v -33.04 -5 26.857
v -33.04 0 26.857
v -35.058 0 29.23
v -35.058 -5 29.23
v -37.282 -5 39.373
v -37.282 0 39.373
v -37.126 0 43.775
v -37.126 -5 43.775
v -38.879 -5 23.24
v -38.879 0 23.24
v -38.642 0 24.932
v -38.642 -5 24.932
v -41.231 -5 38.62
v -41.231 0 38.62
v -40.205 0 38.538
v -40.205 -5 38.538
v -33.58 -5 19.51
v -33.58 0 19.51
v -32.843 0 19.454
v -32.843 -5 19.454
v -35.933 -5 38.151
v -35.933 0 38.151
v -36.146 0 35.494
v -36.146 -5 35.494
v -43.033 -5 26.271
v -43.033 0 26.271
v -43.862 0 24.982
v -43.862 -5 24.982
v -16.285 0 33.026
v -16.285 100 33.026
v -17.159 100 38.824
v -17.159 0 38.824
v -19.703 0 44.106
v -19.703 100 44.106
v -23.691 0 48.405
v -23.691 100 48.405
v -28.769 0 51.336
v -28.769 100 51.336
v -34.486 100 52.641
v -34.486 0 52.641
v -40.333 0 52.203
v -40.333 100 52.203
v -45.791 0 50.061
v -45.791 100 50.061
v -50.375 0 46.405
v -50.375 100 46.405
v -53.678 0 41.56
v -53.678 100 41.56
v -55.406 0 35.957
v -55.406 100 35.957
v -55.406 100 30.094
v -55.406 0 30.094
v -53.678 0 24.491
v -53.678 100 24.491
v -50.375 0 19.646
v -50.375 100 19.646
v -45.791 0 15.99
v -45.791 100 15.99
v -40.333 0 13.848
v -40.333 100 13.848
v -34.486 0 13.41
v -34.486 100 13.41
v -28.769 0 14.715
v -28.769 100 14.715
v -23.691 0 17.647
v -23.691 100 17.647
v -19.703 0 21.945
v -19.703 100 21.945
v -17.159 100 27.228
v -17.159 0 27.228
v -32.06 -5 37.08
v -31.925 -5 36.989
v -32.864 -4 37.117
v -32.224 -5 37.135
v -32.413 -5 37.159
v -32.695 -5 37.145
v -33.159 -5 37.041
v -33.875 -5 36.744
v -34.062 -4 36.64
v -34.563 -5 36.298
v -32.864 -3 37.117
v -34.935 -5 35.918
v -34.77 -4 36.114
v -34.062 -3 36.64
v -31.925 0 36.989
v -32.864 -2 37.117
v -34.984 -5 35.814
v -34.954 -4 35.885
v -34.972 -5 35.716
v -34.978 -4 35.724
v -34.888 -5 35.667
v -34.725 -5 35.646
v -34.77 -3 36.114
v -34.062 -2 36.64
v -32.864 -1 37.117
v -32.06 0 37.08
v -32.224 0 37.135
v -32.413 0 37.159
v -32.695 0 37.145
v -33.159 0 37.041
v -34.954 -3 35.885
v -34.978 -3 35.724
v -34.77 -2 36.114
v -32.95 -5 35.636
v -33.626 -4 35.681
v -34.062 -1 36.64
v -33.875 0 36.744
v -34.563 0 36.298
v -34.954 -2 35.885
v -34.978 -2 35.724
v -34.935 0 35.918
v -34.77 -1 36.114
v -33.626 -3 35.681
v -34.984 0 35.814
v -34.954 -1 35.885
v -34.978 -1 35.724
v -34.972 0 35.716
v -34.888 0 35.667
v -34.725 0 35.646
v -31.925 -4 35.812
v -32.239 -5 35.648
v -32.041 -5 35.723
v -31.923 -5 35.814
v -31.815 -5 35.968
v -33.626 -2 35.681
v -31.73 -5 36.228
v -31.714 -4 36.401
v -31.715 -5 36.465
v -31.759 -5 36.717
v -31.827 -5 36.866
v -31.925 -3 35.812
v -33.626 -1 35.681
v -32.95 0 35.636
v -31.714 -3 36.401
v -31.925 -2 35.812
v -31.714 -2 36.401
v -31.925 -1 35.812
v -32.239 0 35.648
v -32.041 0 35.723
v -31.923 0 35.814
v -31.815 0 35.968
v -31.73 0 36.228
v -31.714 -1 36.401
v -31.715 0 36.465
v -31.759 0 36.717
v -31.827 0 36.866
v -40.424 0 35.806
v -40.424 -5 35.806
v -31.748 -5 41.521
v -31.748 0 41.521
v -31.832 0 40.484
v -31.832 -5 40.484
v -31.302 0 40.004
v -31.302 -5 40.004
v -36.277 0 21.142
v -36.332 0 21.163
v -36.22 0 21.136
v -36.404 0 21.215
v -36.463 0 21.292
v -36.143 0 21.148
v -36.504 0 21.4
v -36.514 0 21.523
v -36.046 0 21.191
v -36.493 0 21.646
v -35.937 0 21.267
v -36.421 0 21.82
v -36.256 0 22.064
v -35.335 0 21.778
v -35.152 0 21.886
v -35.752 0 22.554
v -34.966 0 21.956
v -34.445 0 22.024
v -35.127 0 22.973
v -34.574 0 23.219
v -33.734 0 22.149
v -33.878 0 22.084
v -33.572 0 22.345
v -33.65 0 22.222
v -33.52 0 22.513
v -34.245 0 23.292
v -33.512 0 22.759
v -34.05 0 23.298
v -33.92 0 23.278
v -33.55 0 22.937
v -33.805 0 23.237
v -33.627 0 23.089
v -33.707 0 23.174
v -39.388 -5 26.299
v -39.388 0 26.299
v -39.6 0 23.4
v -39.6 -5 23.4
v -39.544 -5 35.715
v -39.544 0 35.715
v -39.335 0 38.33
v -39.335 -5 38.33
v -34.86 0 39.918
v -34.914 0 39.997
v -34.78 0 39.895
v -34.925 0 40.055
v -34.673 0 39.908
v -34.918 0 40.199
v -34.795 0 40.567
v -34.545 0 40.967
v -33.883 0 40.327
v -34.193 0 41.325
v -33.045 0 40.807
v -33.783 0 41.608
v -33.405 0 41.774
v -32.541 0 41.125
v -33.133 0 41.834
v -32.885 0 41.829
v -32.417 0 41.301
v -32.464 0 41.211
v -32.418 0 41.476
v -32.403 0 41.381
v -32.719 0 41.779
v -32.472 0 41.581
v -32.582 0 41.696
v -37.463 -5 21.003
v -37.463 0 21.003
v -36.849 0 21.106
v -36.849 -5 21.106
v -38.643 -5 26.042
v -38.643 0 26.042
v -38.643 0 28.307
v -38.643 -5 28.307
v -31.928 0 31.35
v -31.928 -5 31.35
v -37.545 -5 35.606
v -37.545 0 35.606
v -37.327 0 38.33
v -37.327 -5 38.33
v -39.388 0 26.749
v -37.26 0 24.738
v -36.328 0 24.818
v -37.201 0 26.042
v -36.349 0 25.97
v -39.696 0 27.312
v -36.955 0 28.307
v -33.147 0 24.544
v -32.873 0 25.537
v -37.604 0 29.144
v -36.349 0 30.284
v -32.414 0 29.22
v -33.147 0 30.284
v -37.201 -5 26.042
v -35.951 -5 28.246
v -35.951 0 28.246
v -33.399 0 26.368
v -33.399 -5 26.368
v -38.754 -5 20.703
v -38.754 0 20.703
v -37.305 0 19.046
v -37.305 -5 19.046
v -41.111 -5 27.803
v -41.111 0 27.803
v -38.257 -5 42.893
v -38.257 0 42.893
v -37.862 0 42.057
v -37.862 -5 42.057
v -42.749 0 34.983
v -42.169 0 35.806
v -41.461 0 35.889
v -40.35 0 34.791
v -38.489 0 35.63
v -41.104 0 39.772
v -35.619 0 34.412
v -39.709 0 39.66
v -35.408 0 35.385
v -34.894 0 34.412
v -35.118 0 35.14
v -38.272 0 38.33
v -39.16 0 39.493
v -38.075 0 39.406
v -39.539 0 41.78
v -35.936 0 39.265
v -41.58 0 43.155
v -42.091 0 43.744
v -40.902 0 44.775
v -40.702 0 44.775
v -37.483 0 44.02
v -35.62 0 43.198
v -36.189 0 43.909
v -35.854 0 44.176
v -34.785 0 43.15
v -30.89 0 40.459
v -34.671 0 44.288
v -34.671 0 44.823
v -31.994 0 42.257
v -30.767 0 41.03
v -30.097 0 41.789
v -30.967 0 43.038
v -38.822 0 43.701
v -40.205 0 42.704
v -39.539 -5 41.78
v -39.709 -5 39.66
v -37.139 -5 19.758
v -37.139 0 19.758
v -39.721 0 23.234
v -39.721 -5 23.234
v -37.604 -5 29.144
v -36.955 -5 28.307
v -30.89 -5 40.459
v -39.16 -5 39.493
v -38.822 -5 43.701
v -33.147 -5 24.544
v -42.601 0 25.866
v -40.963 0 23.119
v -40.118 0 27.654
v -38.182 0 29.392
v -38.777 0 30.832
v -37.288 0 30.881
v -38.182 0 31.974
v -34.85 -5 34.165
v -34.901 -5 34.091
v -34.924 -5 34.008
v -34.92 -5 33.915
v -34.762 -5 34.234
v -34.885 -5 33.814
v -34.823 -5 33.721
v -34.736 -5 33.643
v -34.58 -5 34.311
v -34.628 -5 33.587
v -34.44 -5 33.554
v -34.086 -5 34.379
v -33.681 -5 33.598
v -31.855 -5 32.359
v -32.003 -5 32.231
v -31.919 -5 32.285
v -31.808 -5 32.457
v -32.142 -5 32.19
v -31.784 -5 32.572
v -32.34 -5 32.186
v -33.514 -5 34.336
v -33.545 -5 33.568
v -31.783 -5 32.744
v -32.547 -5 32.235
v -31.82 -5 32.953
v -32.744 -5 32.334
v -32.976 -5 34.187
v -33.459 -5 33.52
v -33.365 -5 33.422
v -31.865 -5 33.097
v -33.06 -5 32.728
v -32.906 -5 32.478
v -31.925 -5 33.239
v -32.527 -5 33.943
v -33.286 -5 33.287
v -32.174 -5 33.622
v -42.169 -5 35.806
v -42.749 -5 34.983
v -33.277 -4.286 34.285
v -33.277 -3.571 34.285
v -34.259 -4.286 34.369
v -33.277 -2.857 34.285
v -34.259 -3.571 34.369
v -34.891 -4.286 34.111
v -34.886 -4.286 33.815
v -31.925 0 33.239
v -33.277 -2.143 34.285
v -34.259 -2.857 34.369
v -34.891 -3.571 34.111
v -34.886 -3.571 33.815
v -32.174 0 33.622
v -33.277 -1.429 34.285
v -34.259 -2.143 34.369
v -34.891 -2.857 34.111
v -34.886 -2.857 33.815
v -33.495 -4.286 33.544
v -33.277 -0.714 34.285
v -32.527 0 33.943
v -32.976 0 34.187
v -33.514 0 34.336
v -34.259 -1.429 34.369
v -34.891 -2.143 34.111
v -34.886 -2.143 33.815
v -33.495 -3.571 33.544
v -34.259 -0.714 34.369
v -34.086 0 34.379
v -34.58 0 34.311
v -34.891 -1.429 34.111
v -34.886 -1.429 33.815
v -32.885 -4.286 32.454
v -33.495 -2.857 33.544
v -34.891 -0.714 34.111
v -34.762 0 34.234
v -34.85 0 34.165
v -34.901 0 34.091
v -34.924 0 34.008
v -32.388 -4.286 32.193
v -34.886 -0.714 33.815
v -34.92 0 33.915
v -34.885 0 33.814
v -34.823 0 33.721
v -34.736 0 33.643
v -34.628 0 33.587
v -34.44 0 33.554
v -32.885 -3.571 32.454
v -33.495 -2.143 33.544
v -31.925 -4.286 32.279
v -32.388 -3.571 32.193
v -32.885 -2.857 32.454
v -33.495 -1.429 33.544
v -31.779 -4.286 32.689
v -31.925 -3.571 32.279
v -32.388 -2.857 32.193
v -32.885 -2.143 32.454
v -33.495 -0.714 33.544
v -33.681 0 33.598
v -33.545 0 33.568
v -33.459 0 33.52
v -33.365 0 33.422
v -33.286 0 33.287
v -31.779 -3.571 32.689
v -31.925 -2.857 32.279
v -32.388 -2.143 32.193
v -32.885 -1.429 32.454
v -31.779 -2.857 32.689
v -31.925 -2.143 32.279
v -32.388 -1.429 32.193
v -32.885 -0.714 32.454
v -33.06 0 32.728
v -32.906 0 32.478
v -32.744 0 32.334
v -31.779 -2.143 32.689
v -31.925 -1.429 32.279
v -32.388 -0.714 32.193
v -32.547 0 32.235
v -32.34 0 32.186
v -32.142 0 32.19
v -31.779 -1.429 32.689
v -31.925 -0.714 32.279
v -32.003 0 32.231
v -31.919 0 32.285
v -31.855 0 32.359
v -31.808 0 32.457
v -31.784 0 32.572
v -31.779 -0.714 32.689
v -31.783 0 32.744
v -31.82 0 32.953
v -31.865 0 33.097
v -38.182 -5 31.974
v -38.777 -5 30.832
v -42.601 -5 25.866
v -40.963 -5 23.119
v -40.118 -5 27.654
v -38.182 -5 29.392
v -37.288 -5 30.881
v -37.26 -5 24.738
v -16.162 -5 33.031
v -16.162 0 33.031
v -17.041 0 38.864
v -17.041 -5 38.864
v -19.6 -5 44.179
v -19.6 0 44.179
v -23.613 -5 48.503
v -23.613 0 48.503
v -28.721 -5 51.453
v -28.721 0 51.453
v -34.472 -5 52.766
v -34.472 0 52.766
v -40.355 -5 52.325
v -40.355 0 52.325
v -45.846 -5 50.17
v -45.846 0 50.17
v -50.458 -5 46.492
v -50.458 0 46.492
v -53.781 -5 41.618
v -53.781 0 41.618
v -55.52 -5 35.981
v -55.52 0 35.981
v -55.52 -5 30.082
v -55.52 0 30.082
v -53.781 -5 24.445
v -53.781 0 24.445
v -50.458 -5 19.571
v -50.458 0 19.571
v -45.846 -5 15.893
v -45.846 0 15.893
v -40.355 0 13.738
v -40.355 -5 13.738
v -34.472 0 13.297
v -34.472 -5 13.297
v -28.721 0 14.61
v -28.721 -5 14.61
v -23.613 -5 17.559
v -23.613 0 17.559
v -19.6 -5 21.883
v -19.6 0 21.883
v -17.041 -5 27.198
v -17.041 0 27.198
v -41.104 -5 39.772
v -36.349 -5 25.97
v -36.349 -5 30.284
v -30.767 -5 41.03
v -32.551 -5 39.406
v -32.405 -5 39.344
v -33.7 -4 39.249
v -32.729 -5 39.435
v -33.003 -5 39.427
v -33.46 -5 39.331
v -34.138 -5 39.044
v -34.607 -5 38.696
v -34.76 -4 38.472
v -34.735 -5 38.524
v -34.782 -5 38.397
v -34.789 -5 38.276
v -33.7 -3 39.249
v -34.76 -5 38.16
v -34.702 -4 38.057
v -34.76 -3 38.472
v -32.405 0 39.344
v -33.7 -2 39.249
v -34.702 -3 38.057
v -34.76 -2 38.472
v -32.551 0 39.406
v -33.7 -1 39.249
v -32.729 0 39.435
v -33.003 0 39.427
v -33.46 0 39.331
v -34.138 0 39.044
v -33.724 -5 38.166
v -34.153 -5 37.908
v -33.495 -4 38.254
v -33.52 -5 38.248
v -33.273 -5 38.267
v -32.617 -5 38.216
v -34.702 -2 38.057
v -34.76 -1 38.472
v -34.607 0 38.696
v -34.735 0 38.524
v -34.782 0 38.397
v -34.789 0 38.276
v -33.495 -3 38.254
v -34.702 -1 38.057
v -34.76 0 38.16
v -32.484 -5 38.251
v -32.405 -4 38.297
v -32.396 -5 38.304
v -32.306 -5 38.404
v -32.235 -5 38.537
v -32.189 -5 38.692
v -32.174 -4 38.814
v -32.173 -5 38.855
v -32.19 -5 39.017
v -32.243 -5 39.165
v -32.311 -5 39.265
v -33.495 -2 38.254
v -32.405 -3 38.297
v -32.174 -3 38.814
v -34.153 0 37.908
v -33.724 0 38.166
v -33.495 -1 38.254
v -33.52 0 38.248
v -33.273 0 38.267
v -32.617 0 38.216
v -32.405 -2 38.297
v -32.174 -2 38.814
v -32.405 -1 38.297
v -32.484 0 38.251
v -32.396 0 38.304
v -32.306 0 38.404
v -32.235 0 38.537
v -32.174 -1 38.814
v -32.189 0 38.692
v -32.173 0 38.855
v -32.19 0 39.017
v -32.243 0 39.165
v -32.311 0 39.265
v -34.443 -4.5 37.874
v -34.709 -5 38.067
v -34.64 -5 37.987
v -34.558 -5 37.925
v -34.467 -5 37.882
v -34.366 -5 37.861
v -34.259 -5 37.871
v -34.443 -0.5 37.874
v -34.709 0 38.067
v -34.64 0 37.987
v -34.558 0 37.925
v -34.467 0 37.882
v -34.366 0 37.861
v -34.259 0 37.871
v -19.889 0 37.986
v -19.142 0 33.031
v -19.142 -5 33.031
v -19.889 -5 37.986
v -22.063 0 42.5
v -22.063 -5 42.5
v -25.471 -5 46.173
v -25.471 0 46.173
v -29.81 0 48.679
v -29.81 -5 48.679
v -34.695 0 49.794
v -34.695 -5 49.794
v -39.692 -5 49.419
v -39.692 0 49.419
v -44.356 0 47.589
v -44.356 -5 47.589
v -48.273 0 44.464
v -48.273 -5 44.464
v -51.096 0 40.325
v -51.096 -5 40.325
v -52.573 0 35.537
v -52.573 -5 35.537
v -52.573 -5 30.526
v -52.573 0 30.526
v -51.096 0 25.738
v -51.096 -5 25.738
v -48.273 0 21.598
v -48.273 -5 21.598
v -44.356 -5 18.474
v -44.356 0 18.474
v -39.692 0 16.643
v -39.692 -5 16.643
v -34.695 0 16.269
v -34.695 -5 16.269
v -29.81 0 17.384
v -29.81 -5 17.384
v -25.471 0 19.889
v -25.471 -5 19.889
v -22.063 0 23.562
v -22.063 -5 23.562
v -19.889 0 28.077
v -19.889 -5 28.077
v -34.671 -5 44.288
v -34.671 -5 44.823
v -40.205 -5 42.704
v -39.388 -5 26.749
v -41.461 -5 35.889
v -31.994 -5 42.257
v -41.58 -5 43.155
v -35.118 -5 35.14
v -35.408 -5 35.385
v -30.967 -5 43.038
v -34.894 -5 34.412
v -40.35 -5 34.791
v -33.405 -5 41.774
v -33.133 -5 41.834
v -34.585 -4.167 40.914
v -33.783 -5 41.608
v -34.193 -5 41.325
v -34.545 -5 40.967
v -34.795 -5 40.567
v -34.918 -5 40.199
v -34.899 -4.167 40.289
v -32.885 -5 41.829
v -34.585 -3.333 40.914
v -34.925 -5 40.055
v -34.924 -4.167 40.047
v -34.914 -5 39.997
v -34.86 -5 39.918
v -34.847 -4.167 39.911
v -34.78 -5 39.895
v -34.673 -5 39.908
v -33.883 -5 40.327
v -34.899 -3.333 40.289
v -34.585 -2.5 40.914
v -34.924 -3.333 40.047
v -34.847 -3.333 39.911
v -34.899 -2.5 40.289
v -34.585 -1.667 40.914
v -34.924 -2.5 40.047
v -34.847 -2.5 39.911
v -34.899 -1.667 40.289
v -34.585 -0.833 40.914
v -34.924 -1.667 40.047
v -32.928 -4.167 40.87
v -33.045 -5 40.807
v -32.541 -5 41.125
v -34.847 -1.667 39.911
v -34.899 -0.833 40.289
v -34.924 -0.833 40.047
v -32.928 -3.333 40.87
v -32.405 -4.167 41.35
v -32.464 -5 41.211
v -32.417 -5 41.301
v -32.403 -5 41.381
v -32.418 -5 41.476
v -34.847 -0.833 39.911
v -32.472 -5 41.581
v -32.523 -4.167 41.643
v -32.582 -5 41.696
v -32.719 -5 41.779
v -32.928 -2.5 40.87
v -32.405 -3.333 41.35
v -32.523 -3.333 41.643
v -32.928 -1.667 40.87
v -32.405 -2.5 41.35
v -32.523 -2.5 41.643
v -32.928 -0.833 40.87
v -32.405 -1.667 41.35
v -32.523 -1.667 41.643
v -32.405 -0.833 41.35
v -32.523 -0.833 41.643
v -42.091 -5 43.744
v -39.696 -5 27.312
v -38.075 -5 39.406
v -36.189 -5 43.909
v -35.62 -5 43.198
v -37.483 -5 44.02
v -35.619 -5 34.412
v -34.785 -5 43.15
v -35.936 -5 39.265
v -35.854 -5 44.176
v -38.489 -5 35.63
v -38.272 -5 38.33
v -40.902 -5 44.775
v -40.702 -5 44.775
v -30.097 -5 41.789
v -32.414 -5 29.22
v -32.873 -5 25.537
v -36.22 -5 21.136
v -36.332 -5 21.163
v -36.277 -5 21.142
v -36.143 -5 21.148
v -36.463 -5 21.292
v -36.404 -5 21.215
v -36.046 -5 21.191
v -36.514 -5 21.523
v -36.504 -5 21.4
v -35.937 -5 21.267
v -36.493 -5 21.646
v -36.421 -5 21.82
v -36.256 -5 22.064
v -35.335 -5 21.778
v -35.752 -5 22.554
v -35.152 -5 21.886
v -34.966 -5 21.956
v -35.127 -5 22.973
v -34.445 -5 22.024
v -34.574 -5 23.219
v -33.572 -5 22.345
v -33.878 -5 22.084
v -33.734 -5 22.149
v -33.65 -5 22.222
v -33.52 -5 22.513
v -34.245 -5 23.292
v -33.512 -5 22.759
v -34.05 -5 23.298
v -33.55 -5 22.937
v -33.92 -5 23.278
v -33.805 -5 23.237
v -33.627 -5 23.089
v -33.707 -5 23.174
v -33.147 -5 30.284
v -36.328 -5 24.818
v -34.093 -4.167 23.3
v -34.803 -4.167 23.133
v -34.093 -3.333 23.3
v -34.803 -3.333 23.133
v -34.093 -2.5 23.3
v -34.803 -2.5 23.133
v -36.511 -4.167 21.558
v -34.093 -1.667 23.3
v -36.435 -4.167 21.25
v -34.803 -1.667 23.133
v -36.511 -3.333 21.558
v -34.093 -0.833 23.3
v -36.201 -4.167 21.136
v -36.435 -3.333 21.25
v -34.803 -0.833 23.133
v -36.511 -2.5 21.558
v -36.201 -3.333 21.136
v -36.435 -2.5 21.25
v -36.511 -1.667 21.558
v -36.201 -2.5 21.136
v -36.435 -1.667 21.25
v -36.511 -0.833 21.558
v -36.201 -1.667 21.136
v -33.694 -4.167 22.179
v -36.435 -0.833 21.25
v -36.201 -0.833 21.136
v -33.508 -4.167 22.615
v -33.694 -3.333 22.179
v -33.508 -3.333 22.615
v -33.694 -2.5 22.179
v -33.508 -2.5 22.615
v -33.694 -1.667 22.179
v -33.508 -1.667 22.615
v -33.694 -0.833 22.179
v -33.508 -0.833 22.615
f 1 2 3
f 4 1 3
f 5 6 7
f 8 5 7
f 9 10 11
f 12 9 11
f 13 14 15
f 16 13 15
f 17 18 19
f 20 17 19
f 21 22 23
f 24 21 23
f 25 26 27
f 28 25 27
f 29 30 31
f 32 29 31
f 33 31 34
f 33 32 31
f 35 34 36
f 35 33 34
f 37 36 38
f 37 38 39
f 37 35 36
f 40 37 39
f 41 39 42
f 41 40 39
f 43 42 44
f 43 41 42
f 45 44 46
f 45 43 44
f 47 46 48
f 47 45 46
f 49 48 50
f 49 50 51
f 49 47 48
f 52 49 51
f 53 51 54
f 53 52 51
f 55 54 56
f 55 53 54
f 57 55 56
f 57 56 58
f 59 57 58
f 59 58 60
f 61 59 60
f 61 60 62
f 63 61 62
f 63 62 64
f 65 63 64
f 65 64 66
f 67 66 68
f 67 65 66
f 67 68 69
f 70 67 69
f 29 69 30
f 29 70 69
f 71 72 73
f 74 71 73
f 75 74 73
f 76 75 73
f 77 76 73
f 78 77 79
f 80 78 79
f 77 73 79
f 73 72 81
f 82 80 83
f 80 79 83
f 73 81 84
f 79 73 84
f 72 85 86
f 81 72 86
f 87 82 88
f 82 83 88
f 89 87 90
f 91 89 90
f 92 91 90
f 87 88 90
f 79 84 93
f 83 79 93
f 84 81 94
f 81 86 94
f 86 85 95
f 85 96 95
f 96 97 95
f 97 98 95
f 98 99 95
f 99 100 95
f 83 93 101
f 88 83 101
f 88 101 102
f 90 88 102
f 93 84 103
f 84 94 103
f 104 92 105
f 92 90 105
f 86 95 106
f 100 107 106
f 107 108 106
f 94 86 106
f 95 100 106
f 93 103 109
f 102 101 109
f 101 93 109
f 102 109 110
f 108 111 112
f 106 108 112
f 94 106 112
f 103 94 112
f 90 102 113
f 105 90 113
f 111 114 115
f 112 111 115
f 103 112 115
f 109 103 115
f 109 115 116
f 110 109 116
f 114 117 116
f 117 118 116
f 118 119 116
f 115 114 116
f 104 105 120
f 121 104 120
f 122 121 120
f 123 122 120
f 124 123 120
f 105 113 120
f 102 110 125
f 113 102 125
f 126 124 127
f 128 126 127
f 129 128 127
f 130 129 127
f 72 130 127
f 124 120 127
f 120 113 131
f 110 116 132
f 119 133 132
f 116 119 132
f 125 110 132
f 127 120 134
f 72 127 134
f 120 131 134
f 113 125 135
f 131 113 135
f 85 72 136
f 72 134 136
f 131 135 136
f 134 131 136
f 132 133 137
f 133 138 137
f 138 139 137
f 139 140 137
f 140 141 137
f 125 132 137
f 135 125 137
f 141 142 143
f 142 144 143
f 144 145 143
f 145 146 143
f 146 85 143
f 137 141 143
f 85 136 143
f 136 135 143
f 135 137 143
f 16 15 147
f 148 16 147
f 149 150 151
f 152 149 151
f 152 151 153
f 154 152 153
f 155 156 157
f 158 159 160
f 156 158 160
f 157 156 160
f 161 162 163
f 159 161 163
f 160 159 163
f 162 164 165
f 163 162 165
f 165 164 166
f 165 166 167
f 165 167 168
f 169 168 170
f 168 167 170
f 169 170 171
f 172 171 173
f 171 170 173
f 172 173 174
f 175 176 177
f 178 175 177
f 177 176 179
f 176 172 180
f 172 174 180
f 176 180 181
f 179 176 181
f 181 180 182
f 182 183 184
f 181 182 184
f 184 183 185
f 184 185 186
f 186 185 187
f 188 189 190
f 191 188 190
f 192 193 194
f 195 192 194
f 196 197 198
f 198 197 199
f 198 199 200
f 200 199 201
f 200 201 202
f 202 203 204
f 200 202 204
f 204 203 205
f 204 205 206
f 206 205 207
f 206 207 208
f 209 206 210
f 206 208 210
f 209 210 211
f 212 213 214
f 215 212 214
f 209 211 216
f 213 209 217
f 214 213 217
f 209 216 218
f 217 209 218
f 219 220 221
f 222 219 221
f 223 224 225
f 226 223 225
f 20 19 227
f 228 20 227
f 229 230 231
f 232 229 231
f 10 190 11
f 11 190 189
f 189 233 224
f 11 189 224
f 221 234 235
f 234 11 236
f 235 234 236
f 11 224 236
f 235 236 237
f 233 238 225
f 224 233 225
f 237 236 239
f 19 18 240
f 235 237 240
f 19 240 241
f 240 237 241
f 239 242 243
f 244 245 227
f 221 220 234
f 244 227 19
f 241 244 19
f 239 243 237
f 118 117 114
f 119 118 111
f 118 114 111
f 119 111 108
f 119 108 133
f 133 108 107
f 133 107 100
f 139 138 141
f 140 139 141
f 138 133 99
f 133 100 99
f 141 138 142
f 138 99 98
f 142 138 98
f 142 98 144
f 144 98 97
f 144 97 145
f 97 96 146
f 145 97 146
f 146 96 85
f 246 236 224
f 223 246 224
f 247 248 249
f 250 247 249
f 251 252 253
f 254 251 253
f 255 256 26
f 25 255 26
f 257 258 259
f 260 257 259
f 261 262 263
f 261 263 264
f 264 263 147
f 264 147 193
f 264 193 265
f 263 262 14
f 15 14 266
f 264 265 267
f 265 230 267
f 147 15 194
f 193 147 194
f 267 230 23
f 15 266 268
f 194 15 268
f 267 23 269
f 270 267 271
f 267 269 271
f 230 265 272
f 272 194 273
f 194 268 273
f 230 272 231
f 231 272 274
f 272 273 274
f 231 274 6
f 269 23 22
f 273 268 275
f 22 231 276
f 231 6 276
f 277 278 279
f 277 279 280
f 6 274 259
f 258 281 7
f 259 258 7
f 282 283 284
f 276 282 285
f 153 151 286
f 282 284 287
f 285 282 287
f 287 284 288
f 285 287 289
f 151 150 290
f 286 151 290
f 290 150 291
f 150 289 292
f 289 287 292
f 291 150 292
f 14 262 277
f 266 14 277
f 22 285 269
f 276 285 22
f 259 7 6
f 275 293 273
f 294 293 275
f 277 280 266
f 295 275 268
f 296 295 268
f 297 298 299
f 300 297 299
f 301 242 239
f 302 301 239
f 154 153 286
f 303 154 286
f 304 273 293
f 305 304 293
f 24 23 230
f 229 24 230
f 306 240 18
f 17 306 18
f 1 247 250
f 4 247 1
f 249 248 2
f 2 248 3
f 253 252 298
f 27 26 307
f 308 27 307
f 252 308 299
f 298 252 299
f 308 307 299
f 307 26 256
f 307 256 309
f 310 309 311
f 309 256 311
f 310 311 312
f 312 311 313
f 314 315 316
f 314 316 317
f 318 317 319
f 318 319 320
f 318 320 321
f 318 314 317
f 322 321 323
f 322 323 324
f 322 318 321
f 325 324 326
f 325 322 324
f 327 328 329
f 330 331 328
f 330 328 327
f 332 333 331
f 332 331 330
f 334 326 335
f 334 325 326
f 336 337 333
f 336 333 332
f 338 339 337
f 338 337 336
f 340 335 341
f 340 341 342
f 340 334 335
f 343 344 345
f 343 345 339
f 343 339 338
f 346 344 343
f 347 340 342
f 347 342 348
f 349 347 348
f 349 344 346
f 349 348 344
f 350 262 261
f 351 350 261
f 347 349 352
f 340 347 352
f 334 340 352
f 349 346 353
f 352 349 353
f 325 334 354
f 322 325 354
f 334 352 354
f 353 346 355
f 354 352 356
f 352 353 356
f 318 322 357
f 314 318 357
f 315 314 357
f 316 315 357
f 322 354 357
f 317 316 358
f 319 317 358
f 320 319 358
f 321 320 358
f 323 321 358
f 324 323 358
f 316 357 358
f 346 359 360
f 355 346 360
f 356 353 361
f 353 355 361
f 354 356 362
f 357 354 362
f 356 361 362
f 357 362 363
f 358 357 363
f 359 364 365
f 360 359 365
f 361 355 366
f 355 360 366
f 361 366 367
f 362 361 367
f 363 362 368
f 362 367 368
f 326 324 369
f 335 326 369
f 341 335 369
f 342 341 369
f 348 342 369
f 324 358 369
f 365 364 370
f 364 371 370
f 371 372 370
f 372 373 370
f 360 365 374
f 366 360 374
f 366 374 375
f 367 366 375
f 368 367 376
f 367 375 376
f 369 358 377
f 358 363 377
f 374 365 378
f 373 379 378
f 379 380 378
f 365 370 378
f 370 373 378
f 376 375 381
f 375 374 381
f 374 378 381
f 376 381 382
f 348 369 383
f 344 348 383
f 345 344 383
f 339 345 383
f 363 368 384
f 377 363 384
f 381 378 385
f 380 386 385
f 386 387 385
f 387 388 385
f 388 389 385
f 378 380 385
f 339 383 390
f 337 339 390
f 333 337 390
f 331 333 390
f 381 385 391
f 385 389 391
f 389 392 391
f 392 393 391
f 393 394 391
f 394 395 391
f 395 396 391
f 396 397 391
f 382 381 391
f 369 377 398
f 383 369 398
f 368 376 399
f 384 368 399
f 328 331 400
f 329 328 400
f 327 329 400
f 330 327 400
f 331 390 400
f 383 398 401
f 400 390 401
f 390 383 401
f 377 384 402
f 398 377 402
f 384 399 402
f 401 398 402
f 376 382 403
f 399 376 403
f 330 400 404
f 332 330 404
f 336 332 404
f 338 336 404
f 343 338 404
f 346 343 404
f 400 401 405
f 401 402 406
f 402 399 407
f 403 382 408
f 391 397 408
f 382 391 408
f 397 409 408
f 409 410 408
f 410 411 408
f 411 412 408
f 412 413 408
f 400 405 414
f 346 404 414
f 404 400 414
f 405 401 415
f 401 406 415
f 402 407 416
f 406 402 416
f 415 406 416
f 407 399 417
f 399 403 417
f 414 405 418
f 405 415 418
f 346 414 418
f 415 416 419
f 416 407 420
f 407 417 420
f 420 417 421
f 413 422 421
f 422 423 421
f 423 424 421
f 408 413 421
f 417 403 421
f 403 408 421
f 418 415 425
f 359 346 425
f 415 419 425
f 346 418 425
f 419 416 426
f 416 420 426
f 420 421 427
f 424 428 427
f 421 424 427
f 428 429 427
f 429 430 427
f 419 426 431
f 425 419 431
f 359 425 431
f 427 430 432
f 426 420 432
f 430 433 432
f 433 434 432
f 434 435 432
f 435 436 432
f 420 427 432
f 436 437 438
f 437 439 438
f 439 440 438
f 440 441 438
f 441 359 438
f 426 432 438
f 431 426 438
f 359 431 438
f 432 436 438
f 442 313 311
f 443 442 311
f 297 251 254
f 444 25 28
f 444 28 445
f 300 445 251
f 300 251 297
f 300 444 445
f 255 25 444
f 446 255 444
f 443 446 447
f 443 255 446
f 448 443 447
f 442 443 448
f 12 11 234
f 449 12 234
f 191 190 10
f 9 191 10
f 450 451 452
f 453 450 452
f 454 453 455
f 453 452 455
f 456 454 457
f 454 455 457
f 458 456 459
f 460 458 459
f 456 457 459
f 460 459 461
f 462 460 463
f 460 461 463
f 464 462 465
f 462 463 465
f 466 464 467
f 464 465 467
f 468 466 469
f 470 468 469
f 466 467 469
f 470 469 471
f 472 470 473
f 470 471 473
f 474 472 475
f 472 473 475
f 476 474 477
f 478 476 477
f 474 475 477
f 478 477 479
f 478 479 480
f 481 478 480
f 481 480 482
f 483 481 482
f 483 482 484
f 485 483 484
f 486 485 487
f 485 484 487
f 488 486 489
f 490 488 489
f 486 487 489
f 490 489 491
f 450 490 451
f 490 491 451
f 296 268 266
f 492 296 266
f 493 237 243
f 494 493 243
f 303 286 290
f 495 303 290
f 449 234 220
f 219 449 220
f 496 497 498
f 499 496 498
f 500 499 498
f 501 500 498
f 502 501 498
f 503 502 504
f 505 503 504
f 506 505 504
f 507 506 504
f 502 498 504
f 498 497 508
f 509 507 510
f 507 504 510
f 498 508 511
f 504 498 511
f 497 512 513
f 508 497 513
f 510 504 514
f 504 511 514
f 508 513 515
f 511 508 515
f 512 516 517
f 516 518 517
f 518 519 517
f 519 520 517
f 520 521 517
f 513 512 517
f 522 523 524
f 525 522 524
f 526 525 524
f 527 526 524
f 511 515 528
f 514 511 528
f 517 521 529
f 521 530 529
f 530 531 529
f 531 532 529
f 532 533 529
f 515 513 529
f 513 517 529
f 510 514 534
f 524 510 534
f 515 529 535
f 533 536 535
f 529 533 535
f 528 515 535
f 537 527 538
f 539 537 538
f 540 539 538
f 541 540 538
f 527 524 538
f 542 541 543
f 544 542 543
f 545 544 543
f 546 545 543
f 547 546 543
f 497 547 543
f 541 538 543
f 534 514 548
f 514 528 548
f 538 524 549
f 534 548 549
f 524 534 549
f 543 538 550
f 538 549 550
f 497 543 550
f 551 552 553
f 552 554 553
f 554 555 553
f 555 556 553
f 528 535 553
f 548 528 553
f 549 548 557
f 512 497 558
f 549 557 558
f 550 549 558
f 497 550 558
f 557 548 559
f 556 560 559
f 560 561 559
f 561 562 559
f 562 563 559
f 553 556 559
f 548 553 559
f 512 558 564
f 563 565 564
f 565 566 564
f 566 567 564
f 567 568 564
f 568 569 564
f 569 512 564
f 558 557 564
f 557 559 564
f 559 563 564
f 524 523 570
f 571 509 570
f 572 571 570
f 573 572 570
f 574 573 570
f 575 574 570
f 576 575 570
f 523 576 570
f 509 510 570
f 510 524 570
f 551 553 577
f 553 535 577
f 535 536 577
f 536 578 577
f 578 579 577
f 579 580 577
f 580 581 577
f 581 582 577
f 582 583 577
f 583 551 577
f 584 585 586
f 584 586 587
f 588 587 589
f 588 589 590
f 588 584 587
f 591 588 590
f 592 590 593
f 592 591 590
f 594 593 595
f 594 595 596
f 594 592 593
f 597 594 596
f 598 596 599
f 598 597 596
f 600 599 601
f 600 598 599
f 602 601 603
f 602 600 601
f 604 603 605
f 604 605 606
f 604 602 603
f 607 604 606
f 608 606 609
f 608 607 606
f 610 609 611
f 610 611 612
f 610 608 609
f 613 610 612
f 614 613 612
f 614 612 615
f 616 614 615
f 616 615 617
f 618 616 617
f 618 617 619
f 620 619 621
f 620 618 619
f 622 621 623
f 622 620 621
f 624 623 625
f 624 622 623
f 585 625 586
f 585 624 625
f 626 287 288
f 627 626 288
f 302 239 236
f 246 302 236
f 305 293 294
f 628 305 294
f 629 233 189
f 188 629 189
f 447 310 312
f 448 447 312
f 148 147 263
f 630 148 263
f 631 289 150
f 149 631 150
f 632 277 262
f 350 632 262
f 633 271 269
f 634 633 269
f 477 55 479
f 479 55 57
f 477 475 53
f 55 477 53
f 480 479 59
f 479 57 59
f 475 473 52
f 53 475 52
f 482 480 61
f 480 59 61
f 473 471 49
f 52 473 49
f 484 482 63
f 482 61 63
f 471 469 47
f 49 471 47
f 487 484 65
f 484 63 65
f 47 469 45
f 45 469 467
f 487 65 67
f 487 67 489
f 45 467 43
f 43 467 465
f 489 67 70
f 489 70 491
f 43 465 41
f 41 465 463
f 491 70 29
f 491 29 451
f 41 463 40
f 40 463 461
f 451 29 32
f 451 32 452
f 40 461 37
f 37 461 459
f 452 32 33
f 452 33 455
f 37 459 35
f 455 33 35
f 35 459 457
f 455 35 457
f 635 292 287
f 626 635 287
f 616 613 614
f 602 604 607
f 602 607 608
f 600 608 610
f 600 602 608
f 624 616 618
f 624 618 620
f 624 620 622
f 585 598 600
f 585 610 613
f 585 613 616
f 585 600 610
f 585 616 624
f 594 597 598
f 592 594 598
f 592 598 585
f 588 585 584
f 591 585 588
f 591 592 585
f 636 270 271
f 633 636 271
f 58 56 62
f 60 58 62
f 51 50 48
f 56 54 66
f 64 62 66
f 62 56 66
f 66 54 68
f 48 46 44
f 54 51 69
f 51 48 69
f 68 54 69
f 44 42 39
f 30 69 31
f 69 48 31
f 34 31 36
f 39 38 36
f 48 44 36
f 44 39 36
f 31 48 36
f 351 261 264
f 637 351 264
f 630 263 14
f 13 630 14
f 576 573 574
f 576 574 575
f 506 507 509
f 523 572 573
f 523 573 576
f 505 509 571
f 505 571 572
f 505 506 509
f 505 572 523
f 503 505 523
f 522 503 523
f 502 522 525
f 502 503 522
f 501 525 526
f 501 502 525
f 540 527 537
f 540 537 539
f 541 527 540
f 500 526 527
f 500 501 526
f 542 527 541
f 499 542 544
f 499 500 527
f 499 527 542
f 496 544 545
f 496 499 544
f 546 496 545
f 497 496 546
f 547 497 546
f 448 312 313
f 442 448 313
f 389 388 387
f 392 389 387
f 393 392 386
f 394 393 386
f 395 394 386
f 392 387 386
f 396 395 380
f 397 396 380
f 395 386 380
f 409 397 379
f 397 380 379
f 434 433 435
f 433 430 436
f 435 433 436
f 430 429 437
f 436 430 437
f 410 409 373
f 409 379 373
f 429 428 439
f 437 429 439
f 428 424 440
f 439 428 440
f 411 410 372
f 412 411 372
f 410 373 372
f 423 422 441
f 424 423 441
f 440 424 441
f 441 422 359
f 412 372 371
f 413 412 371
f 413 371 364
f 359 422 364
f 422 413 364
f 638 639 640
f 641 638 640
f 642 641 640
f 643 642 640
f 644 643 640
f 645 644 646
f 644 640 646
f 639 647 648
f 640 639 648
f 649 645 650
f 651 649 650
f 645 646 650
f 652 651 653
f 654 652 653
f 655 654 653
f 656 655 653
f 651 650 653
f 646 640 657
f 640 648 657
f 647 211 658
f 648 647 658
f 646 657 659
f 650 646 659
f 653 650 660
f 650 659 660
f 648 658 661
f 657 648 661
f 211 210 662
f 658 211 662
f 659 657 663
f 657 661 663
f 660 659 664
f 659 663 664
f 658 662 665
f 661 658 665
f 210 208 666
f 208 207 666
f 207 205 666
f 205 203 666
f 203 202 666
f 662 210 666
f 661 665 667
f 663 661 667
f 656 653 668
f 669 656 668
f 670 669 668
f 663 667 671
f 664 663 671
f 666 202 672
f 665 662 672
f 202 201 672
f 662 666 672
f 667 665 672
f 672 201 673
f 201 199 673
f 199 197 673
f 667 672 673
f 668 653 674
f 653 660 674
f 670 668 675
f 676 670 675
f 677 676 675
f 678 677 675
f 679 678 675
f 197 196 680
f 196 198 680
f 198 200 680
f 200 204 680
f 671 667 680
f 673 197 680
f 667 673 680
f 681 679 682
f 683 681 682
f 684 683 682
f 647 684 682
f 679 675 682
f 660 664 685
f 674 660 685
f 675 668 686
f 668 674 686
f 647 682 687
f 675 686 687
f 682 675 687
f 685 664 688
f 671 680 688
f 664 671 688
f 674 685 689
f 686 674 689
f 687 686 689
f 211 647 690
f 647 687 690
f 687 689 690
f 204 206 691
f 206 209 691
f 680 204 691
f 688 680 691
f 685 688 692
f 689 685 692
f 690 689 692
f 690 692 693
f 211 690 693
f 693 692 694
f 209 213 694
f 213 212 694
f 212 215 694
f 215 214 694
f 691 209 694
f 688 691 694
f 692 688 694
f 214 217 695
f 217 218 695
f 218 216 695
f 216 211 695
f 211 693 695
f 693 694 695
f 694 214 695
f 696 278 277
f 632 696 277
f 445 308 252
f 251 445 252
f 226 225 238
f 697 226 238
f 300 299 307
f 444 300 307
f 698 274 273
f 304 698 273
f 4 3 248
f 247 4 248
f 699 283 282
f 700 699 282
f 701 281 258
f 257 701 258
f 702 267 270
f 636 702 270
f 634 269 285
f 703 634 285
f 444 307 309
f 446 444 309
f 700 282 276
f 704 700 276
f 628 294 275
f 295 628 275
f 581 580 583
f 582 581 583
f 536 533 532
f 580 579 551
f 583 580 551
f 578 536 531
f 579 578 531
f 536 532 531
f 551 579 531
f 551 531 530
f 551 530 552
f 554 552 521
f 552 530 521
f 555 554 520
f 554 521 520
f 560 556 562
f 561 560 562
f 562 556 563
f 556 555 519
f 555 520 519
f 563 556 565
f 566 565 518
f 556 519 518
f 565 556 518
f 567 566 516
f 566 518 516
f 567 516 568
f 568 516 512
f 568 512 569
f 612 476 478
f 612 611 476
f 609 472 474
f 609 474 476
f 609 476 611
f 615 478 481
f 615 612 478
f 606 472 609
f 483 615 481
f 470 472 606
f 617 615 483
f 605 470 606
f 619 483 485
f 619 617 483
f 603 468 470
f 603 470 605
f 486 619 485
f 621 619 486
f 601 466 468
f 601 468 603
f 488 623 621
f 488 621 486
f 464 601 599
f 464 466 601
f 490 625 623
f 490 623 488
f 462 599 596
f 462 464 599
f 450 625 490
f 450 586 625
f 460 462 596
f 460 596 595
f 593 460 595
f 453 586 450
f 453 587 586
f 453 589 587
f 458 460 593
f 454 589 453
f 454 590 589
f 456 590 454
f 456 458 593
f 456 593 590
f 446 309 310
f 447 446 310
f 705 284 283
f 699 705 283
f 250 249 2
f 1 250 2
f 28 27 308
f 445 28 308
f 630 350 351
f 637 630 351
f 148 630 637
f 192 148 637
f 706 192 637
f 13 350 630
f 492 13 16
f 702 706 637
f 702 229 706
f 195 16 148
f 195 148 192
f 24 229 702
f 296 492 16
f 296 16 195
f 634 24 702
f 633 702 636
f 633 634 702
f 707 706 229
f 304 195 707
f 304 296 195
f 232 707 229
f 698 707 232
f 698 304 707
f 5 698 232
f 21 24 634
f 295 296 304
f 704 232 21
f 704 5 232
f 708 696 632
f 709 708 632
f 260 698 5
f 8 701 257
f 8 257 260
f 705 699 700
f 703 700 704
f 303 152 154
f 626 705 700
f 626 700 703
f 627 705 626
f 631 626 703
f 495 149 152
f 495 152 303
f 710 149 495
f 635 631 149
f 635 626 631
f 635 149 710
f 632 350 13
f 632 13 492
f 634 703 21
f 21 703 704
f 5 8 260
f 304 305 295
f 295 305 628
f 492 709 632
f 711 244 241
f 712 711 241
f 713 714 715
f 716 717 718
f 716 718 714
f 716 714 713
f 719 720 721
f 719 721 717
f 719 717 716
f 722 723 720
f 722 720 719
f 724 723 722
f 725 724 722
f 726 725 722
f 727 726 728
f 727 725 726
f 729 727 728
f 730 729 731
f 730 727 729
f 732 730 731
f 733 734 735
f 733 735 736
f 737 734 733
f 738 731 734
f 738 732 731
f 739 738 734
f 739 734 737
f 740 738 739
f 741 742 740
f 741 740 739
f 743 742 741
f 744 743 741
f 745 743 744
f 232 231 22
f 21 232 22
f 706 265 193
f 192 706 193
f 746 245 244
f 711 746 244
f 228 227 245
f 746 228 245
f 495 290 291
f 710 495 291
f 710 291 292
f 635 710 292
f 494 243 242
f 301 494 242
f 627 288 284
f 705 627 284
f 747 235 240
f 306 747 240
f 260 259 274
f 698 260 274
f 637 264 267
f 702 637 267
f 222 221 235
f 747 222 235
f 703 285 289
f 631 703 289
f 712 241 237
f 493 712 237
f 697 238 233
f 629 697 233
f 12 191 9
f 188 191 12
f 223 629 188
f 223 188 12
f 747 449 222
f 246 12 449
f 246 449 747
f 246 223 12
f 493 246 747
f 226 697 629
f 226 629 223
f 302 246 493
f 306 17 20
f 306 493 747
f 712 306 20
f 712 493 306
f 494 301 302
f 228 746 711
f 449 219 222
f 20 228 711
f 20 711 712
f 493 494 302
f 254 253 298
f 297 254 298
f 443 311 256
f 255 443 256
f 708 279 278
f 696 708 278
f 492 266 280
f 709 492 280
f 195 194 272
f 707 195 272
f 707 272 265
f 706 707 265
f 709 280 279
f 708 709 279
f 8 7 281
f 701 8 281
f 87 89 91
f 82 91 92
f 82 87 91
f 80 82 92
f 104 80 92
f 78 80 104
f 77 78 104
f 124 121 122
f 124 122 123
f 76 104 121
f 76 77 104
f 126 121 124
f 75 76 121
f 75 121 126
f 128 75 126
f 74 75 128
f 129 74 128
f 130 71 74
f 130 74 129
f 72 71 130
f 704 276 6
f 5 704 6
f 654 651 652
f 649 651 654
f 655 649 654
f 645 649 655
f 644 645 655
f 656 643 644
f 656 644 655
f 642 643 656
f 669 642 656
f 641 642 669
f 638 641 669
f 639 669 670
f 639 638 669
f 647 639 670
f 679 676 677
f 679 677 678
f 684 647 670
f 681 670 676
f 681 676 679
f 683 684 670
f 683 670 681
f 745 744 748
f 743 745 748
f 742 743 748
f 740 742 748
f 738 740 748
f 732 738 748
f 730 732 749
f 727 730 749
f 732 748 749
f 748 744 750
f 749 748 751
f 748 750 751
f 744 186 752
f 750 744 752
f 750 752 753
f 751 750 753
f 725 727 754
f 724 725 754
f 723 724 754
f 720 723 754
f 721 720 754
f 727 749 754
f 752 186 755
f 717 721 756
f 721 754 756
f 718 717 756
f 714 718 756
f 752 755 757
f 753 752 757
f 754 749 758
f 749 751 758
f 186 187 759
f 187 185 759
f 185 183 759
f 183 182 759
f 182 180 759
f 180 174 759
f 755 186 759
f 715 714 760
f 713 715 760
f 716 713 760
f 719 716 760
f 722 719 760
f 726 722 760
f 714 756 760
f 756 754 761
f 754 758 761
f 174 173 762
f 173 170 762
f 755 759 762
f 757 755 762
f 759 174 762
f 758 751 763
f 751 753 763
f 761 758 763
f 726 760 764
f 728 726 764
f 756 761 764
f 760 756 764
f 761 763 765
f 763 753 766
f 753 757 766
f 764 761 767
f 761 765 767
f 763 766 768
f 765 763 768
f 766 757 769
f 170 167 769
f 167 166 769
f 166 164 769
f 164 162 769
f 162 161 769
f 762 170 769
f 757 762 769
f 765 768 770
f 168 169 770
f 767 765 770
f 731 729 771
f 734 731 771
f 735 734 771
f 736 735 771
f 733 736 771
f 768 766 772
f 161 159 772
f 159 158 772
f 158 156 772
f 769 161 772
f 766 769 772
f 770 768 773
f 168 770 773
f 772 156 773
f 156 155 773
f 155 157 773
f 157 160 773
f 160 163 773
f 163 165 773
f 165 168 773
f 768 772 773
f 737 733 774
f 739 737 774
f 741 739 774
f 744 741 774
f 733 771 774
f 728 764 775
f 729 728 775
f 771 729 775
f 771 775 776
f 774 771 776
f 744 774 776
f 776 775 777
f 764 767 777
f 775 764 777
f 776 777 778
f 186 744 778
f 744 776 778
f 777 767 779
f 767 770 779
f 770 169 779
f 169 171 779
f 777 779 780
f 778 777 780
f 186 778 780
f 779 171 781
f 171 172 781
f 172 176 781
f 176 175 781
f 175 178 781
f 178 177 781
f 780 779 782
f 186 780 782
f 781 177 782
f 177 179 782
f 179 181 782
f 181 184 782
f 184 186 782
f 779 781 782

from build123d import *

# Parameters (mm, degrees)
F1_DEPTH = 5
F2_R     = 19.6704764398
F3_DEPTH = 100
F0_R     = 19.7896434189
F0_R_2   = 16.8093262281
F4_DEPTH = 5


with BuildPart() as f1:
    # F0 (on Front) → F1 (new body)
    with BuildSketch(Plane.XZ):
        Polygon((-41.5796749294, 43.1548319757), (-42.1691797674, 35.8056649566), (-42.7485704422, 34.9834747612), (-40.3496834117, 34.7910508435), (-35.6193675659, 34.4116140897), (-34.8944440484, 34.4116140897), (-35.1175740361, 35.1396650076), (-35.4076400399, 35.3851057589), (-34.7847773867, 43.1501339202), (-31.9937728345, 42.2574691474), (-31.7483320832, 41.5211431682), (-31.8315630384, 40.4835296467), (-31.3020721078, 40.0038696826), (-30.8899864178, 40.4587661755), (-30.7665653527, 41.0302616656), (-30.0971791148, 41.7888984084), (-30.9673808515, 43.0384166539), (-34.6713140607, 44.2879386246), (-34.6713140607, 44.8234453797), (-35.8538962901, 44.1763736308), (-36.1885912716, 43.9086183906), (-35.6204303075, 43.1984152092), (-35.9359305766, 39.2651749322), (-37.2823948352, 39.3731799881), (-37.1257290244, 43.7747426331), (-37.4827347696, 44.0201833844), (-38.2574704876, 42.8932918603), (-37.8620550036, 42.0566499233), (-38.0746781065, 39.4059461564), (-39.1595974577, 39.4929716934), (-38.822080276, 43.7006897318), (-40.2049049735, 42.7037253976), (-39.5390333262, 41.7801379355), (-39.7091111944, 39.6598319118), (-41.1035171997, 39.7716825588), (-40.702216146, 44.7745735937), (-40.9018468548, 44.7745735937), (-42.0905798674, 43.7443368137), align=None)
        Polygon((-41.4605582675, 35.8888042588), (-41.2312969565, 38.6204719543), (-40.2049049735, 38.5381411217), (-40.4240873536, 35.8056649566), align=None, mode=Mode.SUBTRACT)
        Polygon((-39.5444826137, 35.7151502744), (-39.3347032368, 38.3304022253), (-38.2720401508, 38.3304022253), (-38.4886132641, 35.6304549493), align=None, mode=Mode.SUBTRACT)
        Polygon((-37.5450731077, 35.6060767198), (-37.3265445232, 38.3304022253), (-35.932836109, 38.1510738569), (-36.1459821909, 35.4938502781), align=None, mode=Mode.SUBTRACT)
    extrude(amount=F1_DEPTH)


with BuildPart() as f1b:
    # F0 (on Front) → F1, piece 2 (new body)
    with BuildSketch(Plane.XZ):
        with BuildLine():
            add(Edge.make_bspline(
                [(-32.8847616911, 41.8292991817), (-33.3899181796, 41.9163890558), (-34.724803851, 41.1687672813), (-35.1610051658, 39.4598367454), (-33.6263030828, 40.5227774765), (-33.0038166649, 40.8162083153), (-32.1682868047, 41.3048289751), (-32.5853948261, 41.7776878035), (-32.8847616911, 41.8292991817)],
                knots=[0, 0, 0, 0, 0.2263847988, 0.3922229878, 0.574245921, 0.7285983688, 0.8658393804, 1, 1, 1, 1], degree=3))
        make_face()
    extrude(amount=F1_DEPTH)


with BuildPart() as f1c:
    # F0 (on Front) → F1, piece 3 (new body)
    with BuildSketch(Plane.XZ):
        with BuildLine():
            add(Edge.make_bspline(
                [(-32.4050933123, 39.3437333405), (-32.9469671099, 39.6823583375), (-35.3833302061, 38.6995477605), (-34.3044056061, 37.54626355), (-33.5639546752, 38.5486867669), (-32.2264999458, 37.8596789326), (-32.0552685879, 39.1251226663), (-32.4050933123, 39.3437333405)],
                knots=[0, 0, 0, 0, 0.2890600572, 0.444461227, 0.6228512175, 0.8133876278, 1, 1, 1, 1], degree=3))
        make_face()
    extrude(amount=F1_DEPTH)


with BuildPart() as f1d:
    # F0 (on Front) → F1, piece 4 (new body)
    with BuildSketch(Plane.XZ):
        with BuildLine():
            add(Edge.make_bspline(
                [(-31.9254212081, 36.9889847934), (-32.3258786486, 37.3596972584), (-34.0827070521, 36.8541577833), (-35.5084277609, 35.443865143), (-33.5319460304, 35.8334021386), (-31.686615015, 35.3273107748), (-31.6301066857, 36.7156054939), (-31.9254212081, 36.9889847934)],
                knots=[0, 0, 0, 0, 0.23872911, 0.4233660064, 0.6120543016, 0.8239508972, 1, 1, 1, 1], degree=3))
        make_face()
    extrude(amount=F1_DEPTH)


with BuildPart() as f1e:
    # F0 (on Front) → F1, piece 5 (new body)
    with BuildSketch(Plane.XZ):
        with BuildLine():
            add(Edge.make_bspline(
                [(-31.9254212081, 33.2388281822), (-32.1576729025, 33.7255249101), (-33.0813895627, 34.4976511923), (-35.2075582895, 34.3752193824), (-34.6827847742, 33.3037729464), (-33.2204831342, 33.9482992986), (-33.164638359, 32.245918687), (-31.667575709, 32.0343479274), (-31.7514399686, 32.8742405298), (-31.9254212081, 33.2388281822)],
                knots=[0, 0, 0, 0, 0.1744229587, 0.3443637696, 0.4463996982, 0.588495804, 0.7376108212, 0.8693386387, 1, 1, 1, 1], degree=3))
        make_face()
    extrude(amount=F1_DEPTH)


with BuildPart() as f1f:
    # F0 (on Front) → F1, piece 6 (new body)
    with BuildSketch(Plane.XZ):
        Polygon((-38.7543961406, 20.7027792931), (-37.3049490154, 19.0462674946), (-37.1387079358, 19.7579413652), (-39.7209525108, 23.2340395451), (-42.6011495292, 25.8659422398), (-40.1182211936, 27.653651312), (-38.1815358996, 29.3917004019), (-37.2876822948, 30.8814570308), (-38.1815358996, 31.9739431143), (-38.7774407864, 30.8317989111), (-41.1113910377, 27.802625671), (-43.0331647859, 26.271359936), (-43.8619740307, 24.9821022153), (-40.9630797803, 23.1185257435), align=None)
    extrude(amount=F1_DEPTH)


with BuildPart() as f1g:
    # F0 (on Front) → F1, piece 7 (new body)
    with BuildSketch(Plane.XZ):
        Polygon((-39.387986064, 26.2991040945), (-39.6001301706, 23.3998131007), (-38.8791119831, 23.2396339033), (-38.6415381689, 24.9322737646), (-37.2599773109, 24.738362059), (-37.4631248415, 21.0026744753), (-36.848898977, 21.1057402194), (-36.3279175981, 24.8175712232), (-33.1467017531, 24.5438050479), (-33.5798734779, 19.5102659235), (-32.8433252871, 19.453600049), (-31.9281183183, 31.3495434821), (-33.1467017531, 30.2835088223), (-32.4141656629, 29.2200065182), (-32.8726023436, 25.5372300744), (-36.3493598998, 25.9700212628), (-36.3493598998, 30.2835088223), (-37.6044549048, 29.1438251734), (-36.9552671909, 28.30709517), (-37.2005142272, 26.0421540588), (-38.6431515217, 26.0421540588), (-38.6431515217, 28.30709517), (-39.6962761879, 27.3116752505), (-39.387986064, 26.7490465194), align=None)
    extrude(amount=F1_DEPTH)


with BuildPart() as f1h:
    # F0 (on Front) → F1, piece 8 (new body)
    with BuildSketch(Plane.XZ):
        with BuildLine():
            add(Edge.make_bspline(
                [(-33.6274653673, 23.0885390192), (-33.828339504, 23.3671680659), (-34.9027156497, 23.3458686855), (-36.8776589881, 21.7184014786), (-36.1245036706, 20.8130052766), (-35.2136699856, 22.2884176318), (-33.481365593, 21.7903943146), (-33.4506161377, 22.8432345064), (-33.6274653673, 23.0885390192)],
                knots=[0, 0, 0, 0, 0.1632628382, 0.3926907011, 0.5015984401, 0.6767348911, 0.8562636901, 1, 1, 1, 1], degree=3))
        make_face()
    extrude(amount=F1_DEPTH)


with BuildPart() as f1i:
    # F0 (on Front) → F1, piece 9 (new body)
    with BuildSketch(Plane.XZ):
        Polygon((-33.0397825688, 26.8568928501), (-35.0579544902, 29.23033759), (-35.9511598945, 28.2459892333), (-33.3991460502, 26.3684373349), align=None)
    extrude(amount=F1_DEPTH)


with BuildPart() as f3:
    # F2 (on face) → F3 (new body)
    with BuildSketch(Plane.XZ):
        with Locations((-35.955555737, 33.0255739391)):
            Circle(F2_R)
    extrude(amount=-F3_DEPTH)

    # F0 (on Front) → F4 (join)
    with BuildSketch(Plane.XZ):
        with Locations((-35.9511598945, 33.0312512815)):
            Circle(F0_R)
        with Locations((-35.9511598945, 33.0312512815)):
            Circle(F0_R_2, mode=Mode.SUBTRACT)
    extrude(amount=F4_DEPTH)


solid = Compound([f1.part, f1b.part, f1c.part, f1d.part, f1e.part, f1f.part, f1g.part, f1h.part, f1i.part, f3.part])
